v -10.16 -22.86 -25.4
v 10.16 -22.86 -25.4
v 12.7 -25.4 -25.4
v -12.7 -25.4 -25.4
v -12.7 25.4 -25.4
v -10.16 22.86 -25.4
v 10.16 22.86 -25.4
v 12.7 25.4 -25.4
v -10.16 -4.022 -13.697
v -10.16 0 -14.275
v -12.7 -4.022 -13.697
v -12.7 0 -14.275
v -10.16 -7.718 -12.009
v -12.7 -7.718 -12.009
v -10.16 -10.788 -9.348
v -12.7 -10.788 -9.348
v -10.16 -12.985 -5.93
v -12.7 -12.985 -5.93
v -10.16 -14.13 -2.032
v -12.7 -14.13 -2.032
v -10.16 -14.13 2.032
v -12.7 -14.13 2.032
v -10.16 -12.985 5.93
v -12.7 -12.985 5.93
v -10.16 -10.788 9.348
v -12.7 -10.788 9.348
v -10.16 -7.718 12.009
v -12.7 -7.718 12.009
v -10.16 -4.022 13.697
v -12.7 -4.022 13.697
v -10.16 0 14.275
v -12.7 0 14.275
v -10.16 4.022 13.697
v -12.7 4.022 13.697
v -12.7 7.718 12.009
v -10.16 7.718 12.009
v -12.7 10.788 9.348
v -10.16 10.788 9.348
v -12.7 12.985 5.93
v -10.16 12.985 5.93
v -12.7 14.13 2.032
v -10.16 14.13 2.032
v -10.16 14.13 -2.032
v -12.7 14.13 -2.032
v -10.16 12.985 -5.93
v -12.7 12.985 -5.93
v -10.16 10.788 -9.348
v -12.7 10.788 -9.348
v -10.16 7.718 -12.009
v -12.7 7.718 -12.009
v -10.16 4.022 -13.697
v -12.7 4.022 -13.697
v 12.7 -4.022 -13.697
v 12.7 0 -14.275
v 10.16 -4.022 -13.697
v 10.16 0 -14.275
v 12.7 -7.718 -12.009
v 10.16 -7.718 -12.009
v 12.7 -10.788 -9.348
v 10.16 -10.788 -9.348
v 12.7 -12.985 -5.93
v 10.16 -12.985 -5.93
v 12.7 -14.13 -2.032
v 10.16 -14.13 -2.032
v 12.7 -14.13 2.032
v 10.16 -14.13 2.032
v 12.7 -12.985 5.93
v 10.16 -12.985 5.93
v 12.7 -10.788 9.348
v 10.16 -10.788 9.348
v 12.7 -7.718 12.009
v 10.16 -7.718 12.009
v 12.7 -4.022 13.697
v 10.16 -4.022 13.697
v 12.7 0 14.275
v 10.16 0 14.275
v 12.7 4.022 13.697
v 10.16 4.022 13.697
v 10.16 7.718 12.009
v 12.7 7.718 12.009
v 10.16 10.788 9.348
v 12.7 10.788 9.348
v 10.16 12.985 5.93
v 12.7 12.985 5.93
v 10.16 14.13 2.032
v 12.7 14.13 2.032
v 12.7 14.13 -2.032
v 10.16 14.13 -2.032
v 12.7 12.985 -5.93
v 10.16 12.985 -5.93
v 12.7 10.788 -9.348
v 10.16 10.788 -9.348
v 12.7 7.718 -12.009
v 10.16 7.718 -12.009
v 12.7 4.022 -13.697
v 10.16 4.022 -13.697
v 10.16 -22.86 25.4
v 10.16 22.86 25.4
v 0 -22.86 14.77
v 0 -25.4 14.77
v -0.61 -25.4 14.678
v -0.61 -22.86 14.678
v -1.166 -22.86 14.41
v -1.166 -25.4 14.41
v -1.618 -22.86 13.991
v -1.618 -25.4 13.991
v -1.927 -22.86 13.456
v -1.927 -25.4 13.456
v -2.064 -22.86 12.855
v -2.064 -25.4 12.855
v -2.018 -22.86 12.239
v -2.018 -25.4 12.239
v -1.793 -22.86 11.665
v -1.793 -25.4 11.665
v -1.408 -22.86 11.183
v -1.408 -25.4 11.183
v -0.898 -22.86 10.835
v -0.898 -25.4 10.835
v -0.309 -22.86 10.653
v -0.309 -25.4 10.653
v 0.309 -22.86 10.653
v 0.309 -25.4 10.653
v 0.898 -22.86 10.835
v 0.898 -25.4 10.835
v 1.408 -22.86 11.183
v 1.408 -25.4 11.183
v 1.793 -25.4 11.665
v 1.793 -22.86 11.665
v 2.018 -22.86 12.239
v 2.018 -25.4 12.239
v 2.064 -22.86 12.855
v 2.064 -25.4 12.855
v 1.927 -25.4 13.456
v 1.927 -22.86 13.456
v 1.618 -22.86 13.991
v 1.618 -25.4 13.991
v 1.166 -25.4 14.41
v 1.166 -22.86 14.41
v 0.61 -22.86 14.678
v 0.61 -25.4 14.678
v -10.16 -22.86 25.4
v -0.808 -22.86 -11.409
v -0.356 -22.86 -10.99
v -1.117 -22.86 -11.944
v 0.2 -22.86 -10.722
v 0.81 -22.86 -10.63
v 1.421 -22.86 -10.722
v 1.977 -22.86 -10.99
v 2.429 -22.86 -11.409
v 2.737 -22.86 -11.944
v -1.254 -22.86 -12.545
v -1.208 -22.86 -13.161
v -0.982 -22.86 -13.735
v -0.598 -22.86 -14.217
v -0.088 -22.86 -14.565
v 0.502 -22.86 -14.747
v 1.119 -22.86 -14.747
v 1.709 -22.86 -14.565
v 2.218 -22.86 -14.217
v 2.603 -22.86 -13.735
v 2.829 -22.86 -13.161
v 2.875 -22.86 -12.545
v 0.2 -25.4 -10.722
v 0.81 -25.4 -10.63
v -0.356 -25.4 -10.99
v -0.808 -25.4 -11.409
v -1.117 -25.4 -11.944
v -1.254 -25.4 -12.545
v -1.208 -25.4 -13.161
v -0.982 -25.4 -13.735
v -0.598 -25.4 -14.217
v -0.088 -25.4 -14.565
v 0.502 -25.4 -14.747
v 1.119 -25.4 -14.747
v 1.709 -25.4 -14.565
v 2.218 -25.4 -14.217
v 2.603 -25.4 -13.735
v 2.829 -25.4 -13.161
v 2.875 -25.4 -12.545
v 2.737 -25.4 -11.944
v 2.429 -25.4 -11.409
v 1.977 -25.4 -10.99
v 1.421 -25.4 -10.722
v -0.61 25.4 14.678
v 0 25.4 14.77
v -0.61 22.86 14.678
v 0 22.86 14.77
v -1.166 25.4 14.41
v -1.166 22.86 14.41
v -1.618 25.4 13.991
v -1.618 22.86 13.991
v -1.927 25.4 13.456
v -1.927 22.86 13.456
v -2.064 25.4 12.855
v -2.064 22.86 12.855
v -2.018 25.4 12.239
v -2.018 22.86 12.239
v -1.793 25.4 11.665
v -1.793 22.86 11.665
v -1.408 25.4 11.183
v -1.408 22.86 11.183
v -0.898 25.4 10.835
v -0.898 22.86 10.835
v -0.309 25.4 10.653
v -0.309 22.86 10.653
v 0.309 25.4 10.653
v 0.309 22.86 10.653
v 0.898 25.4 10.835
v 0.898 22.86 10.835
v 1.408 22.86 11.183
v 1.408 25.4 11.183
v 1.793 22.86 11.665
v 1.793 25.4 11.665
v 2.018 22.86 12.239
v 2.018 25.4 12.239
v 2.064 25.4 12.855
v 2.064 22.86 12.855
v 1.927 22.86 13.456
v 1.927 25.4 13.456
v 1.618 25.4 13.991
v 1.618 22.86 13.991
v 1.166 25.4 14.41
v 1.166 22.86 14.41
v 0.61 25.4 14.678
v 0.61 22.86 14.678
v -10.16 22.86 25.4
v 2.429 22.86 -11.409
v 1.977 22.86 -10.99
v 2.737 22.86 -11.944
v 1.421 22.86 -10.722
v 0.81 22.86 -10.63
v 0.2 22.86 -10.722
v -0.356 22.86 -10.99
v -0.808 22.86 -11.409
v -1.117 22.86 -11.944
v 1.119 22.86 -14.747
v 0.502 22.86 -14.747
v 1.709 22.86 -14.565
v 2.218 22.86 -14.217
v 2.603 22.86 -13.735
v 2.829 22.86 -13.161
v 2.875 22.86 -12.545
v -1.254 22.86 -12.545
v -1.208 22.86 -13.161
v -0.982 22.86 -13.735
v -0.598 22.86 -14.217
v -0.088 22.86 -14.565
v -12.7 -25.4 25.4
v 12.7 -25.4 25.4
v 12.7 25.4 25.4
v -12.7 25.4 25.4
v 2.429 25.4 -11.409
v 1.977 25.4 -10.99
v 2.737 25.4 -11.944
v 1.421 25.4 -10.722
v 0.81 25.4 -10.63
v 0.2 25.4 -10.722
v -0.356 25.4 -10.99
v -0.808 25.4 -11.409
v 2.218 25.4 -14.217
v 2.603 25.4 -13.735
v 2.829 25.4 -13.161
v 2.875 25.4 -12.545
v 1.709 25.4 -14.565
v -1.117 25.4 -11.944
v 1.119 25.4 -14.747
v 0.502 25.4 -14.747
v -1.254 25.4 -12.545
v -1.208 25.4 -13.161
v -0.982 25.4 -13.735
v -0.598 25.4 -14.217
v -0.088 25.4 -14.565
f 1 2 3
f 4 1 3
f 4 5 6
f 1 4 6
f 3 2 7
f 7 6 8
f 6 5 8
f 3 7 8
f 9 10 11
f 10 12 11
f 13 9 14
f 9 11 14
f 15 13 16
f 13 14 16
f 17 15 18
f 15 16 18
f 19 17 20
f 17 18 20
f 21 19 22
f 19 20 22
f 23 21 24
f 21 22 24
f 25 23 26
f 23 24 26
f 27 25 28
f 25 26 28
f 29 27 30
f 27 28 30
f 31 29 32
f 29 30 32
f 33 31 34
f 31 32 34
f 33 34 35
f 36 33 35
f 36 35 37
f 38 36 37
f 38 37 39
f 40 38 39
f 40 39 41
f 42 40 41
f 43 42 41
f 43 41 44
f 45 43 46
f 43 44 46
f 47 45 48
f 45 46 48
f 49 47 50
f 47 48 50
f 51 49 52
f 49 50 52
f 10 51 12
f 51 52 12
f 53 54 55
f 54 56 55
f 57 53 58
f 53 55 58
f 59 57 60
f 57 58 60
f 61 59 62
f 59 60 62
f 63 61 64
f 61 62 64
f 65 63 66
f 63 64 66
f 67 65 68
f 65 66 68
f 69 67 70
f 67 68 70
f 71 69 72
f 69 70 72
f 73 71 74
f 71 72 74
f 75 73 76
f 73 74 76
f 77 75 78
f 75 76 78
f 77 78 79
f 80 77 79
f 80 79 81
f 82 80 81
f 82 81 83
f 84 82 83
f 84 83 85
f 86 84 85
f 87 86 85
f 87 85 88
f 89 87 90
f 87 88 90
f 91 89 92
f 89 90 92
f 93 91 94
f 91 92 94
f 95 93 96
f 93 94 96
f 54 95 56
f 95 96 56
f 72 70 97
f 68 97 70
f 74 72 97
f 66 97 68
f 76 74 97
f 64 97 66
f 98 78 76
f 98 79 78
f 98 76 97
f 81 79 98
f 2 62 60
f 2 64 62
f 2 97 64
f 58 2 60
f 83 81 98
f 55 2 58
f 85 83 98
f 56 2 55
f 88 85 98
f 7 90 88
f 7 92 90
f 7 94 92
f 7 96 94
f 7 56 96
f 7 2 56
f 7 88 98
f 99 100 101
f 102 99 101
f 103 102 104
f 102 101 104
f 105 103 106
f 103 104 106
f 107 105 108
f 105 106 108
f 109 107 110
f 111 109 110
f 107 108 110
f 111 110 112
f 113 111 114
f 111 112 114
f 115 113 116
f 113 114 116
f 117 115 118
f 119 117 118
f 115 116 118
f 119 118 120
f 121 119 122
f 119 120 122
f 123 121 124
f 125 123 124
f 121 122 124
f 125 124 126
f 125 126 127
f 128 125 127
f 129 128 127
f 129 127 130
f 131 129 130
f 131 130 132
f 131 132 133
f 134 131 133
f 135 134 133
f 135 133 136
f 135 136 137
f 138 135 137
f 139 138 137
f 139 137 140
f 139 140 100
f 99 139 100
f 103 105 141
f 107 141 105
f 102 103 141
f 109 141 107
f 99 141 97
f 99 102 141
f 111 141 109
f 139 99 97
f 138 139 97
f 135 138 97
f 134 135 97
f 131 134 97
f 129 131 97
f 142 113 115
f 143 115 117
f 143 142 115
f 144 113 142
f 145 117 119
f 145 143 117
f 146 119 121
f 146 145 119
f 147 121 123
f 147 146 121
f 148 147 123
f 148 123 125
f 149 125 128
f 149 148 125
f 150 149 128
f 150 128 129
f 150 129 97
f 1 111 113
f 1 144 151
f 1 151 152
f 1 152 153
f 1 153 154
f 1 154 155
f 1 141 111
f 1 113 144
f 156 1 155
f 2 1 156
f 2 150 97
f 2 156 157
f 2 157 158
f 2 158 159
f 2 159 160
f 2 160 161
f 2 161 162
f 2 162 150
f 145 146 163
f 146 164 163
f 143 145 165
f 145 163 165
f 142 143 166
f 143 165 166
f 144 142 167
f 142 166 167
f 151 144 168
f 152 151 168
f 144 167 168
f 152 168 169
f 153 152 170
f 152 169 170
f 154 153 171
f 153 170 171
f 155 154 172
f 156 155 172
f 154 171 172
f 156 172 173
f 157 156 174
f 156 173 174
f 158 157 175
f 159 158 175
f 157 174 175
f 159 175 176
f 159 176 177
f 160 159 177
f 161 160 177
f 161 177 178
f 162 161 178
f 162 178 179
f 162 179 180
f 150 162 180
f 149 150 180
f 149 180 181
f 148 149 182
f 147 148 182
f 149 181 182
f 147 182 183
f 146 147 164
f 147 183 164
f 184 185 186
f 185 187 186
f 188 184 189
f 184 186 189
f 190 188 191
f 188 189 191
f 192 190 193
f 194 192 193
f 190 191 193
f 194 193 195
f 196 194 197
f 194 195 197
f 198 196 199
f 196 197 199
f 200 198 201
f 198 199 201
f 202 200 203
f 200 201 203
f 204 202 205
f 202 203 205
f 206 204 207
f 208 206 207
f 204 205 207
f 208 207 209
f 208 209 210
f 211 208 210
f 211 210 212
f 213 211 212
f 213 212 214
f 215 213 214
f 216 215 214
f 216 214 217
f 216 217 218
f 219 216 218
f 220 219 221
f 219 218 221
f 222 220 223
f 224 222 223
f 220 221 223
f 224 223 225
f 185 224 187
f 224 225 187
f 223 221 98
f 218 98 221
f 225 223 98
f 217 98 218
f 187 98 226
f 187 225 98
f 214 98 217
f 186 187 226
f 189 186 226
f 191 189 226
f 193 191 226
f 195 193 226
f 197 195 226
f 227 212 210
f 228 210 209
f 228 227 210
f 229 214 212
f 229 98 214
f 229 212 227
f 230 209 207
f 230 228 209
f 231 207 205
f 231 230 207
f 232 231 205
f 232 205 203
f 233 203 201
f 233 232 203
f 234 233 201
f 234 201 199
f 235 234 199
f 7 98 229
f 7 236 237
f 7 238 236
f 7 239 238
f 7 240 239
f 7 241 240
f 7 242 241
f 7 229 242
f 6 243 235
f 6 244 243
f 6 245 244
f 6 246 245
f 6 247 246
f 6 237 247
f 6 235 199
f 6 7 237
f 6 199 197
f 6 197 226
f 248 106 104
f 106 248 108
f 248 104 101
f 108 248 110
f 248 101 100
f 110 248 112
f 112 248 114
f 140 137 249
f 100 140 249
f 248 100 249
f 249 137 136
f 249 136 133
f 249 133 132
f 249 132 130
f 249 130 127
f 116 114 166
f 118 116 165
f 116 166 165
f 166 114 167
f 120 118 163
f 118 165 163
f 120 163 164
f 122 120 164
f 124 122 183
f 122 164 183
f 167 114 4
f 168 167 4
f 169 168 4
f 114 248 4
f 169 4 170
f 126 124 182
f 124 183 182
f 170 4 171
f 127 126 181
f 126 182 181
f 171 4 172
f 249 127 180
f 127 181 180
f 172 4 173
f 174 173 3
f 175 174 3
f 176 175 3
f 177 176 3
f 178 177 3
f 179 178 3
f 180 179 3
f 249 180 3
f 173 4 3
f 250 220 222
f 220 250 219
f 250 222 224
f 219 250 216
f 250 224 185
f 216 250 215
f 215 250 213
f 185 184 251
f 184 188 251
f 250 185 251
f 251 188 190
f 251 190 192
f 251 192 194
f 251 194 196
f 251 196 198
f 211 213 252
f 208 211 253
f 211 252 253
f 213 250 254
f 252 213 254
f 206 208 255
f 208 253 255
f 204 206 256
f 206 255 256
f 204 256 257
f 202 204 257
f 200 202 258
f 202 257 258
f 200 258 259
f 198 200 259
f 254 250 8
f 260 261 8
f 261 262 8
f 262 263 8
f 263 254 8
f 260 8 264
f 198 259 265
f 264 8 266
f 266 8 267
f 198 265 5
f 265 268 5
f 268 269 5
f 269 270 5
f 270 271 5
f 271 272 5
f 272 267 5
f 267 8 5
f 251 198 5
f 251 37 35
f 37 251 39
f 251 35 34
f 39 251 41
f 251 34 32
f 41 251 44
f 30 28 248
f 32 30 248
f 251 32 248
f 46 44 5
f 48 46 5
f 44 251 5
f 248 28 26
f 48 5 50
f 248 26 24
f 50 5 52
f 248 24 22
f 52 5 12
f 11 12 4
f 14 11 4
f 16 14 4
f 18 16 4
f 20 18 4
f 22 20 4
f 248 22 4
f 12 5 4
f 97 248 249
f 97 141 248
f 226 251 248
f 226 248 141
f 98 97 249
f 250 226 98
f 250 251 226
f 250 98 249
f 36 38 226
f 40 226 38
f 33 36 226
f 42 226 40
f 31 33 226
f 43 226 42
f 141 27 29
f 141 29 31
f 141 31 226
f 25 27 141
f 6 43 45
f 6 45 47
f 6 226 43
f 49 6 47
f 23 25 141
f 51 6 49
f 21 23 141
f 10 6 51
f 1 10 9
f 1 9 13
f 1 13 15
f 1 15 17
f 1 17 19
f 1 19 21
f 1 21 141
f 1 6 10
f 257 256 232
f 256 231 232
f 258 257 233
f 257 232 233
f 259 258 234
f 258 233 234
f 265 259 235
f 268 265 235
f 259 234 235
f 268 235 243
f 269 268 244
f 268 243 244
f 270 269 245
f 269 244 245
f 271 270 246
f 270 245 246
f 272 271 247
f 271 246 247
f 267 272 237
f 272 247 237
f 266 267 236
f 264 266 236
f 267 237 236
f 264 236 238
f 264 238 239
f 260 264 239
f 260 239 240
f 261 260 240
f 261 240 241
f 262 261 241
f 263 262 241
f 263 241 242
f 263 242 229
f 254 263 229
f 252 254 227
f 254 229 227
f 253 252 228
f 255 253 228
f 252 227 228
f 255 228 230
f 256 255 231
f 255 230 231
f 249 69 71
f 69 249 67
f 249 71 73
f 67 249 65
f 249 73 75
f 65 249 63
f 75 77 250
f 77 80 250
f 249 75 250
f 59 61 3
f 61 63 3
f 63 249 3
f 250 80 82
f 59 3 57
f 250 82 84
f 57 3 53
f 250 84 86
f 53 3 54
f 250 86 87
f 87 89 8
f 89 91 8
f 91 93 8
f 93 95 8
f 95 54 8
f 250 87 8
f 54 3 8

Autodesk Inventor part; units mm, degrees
ref_plane "YZ Plane" through (0, 0, 0) normal (1, 0, 0) x (0, 1, 0)
ref_plane "XZ Plane" through (0, 0, 0) normal (0, 1, 0) x (-1, 0, 0)
ref_plane "XY Plane" through (0, 0, 0) normal (0, 0, 1) x (1, 0, 0)
sketch "Sketch1" plane through (0, 0, 0) normal (0, 0, 1) x (1, 0, 0)
  line L0 (-12.7, -25.4) -> (12.7, -25.4)
  line L1 (12.7, -25.4) -> (12.7, 25.4)
  line L2 (12.7, 25.4) -> (-12.7, 25.4)
  line L3 (-12.7, 25.4) -> (-12.7, -25.4)
  line L4 (-12.7, -25.4) -> (12.7, 25.4) construction
  line L5 (12.7, -25.4) -> (-12.7, 25.4) construction
  line L6 (-10.16, -22.86) -> (10.16, -22.86)
  line L7 (10.16, -22.86) -> (10.16, 22.86)
  line L8 (10.16, 22.86) -> (-10.16, 22.86)
  line L9 (-10.16, 22.86) -> (-10.16, -22.86)
  line L10 (-10.16, -22.86) -> (10.16, 22.86) construction
  line L11 (10.16, -22.86) -> (-10.16, 22.86) construction
  point P0 (0, 0)
  dimension "d0" = 25.4
  dimension "d1" = 50.8
  dimension "d2" = 20.32
  dimension "d3" = 45.72
extrude "Extrusion1" add sketch "Sketch1" along normal mid plane 50.8
sketch "Sketch2" plane through (-12.7, 25.4, 25.4) normal (0, 1, 0) x (1, 0, 0)
  line L0 (25.4, 0) -> (0, 0) projected
  line L1 (25.4, 50.8) -> (25.4, 0) projected
  point P0 (12.7, 25.4)
  point P1 (12.7, 12.7)
  point P2 (13.5104, 38.1)
  dimension "d6" = 25.4
  dimension "d7" = 12.7
  dimension "d8" = 12.7
hole "Hole1" at (0, 25.4, 12.7) at (0.8104, 25.4, -12.7) direction (0, -1, 0) diameter 4.1402 end through all
sketch "Sketch3" plane through (12.7, -25.4, 25.4) normal (1, 0, 0) x (0, 0, -1)
  point P0 (25.4, 25.4)
  point P1 (25.4, 25.4)
hole "Hole2" at (12.7, 0, 0) direction (-1, 0, 0) diameter 28.5496 end through all
properties part number "Pulley_holder"
